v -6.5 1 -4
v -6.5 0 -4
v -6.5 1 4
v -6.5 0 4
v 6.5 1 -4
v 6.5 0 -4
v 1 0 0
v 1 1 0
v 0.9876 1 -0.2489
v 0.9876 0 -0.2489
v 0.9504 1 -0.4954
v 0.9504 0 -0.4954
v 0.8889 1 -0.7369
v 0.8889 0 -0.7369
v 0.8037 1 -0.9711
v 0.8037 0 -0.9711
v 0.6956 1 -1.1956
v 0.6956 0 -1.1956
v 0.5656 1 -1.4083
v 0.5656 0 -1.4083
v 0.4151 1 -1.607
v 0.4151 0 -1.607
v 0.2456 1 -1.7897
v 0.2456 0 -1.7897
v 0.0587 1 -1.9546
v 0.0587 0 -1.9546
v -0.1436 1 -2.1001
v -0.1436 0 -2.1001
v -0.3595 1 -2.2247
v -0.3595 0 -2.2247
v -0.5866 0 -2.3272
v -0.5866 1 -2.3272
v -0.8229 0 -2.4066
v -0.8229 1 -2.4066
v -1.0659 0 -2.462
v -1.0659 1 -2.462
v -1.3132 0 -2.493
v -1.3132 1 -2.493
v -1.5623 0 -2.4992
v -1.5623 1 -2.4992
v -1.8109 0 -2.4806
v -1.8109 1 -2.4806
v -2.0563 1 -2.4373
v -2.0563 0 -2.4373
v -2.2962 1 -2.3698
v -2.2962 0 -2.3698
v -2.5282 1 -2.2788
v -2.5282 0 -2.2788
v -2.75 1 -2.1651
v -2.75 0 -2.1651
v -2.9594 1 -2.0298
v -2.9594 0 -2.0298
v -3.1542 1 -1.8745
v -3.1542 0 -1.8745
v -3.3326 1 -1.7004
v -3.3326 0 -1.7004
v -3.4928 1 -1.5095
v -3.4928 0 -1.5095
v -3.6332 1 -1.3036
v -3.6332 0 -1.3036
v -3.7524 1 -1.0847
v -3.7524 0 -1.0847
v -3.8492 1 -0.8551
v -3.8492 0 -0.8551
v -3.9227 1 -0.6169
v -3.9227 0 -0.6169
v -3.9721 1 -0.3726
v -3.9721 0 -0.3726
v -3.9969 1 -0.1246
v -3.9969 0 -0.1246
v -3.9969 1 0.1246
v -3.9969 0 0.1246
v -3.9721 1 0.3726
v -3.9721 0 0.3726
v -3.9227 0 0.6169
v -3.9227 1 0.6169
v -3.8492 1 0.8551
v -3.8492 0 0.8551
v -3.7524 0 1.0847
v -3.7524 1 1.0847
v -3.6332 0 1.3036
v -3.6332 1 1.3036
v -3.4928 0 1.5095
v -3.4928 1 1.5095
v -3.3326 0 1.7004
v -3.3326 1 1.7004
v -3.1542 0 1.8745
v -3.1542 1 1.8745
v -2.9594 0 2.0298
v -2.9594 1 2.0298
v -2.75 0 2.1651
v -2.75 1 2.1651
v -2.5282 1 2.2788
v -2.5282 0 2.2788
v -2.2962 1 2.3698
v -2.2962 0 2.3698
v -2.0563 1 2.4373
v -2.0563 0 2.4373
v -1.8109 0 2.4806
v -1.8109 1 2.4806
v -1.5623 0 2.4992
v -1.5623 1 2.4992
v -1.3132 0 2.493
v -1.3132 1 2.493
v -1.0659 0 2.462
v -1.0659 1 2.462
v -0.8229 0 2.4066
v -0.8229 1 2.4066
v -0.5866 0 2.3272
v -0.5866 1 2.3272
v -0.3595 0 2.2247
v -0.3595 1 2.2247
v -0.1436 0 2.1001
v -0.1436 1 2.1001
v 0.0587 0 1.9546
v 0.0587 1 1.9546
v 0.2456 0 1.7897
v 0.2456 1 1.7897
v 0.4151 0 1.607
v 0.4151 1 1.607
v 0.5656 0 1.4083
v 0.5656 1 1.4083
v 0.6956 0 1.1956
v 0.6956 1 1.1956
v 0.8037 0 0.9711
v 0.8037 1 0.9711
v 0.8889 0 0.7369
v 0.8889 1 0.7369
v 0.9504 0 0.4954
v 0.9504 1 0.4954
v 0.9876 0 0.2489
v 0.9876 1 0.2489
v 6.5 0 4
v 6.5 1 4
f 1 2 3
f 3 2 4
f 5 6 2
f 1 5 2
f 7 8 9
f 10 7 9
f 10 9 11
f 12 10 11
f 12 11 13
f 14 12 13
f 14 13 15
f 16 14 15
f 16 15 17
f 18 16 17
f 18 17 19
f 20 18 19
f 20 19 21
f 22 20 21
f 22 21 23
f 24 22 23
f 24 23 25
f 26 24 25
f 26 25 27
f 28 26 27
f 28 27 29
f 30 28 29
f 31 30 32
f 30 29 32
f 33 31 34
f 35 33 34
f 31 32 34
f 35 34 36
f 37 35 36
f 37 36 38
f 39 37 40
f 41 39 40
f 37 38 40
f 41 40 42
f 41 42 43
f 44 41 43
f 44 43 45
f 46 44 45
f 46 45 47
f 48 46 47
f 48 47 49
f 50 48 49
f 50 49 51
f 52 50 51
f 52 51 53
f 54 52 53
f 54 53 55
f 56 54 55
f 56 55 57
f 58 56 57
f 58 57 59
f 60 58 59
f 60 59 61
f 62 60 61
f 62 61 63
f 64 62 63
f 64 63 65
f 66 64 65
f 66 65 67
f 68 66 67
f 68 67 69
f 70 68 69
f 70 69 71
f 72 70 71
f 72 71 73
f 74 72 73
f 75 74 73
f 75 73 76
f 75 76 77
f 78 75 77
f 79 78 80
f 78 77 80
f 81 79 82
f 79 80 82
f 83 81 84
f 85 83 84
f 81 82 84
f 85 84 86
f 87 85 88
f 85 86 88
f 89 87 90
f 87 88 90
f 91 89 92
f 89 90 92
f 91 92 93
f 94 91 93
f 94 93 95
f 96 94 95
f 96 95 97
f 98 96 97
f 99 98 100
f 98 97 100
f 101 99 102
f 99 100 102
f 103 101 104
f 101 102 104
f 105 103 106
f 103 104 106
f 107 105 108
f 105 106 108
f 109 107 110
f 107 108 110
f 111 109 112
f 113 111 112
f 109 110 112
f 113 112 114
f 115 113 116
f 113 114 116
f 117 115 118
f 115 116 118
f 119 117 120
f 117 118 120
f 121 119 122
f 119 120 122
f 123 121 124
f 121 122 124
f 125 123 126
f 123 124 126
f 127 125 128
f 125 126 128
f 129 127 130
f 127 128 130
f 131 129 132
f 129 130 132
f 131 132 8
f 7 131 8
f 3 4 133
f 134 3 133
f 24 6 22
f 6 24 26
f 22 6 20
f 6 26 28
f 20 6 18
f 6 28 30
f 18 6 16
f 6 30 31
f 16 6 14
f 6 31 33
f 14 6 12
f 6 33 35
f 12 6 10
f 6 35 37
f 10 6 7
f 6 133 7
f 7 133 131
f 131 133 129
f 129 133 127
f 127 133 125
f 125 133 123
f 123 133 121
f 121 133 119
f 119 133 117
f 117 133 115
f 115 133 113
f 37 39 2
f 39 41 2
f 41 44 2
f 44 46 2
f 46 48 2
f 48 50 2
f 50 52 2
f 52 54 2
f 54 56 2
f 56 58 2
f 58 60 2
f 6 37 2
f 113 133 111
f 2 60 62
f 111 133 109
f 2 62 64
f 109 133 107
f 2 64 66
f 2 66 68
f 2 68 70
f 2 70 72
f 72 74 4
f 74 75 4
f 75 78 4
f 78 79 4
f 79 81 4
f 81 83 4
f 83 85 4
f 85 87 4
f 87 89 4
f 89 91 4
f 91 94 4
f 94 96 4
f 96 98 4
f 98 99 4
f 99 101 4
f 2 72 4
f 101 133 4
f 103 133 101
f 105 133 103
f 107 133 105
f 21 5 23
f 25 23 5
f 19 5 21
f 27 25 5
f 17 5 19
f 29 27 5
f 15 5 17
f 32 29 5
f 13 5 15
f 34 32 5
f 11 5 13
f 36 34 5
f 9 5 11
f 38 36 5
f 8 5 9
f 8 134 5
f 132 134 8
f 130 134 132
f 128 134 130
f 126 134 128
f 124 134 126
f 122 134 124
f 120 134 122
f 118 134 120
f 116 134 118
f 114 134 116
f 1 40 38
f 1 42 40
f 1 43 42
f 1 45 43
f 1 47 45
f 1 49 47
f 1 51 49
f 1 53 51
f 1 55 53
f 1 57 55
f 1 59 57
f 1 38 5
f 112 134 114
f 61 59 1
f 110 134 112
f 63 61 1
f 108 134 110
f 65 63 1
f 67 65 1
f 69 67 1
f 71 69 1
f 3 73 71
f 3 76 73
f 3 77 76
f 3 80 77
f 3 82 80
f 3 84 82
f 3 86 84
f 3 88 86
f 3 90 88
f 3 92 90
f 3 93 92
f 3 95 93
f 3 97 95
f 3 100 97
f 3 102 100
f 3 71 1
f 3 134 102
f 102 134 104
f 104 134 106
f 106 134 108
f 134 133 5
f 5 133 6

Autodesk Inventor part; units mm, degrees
ref_plane "YZ Plane" through (0, 0, 0) normal (1, 0, 0) x (0, 1, 0)
ref_plane "XZ Plane" through (0, 0, 0) normal (0, 1, 0) x (-1, 0, 0)
ref_plane "XY Plane" through (0, 0, 0) normal (0, 0, 1) x (1, 0, 0)
sketch "Sketch1" plane through (0, 0, 0) normal (0, 1, 0) x (-1, 0, 0)
  line L0 (6.5, 4) -> (-6.5, 4)
  line L1 (-6.5, 4) -> (-6.5, -4)
  line L2 (-6.5, -4) -> (6.5, -4)
  line L3 (6.5, -4) -> (6.5, 4)
  line L4 (6.5, 4) -> (-6.5, -4) construction
  line L5 (-6.5, 4) -> (6.5, -4) construction
  point P0 (0, 0)
  dimension "d0" = 13
  dimension "d1" = 8
extrude "Extrusion1" add sketch "Sketch1" along normal blind 1
sketch "Sketch2" plane through (0, 1, 0) normal (0, 1, 0) x (1, 0, 0)
  line L0 (-6.5, 4) -> (-6.5, -4) construction
  line L1 (-6.5, 0) -> (-1.5, 0) construction
  circle A0 centre (-1.5, 0) radius 2.5
  point P0 (0, 0)
  dimension "d4" = 5
  dimension "d5" = 5
extrude "Extrusion2" cut sketch "Sketch2" against normal through all
properties part number "Rectangular Piece"
